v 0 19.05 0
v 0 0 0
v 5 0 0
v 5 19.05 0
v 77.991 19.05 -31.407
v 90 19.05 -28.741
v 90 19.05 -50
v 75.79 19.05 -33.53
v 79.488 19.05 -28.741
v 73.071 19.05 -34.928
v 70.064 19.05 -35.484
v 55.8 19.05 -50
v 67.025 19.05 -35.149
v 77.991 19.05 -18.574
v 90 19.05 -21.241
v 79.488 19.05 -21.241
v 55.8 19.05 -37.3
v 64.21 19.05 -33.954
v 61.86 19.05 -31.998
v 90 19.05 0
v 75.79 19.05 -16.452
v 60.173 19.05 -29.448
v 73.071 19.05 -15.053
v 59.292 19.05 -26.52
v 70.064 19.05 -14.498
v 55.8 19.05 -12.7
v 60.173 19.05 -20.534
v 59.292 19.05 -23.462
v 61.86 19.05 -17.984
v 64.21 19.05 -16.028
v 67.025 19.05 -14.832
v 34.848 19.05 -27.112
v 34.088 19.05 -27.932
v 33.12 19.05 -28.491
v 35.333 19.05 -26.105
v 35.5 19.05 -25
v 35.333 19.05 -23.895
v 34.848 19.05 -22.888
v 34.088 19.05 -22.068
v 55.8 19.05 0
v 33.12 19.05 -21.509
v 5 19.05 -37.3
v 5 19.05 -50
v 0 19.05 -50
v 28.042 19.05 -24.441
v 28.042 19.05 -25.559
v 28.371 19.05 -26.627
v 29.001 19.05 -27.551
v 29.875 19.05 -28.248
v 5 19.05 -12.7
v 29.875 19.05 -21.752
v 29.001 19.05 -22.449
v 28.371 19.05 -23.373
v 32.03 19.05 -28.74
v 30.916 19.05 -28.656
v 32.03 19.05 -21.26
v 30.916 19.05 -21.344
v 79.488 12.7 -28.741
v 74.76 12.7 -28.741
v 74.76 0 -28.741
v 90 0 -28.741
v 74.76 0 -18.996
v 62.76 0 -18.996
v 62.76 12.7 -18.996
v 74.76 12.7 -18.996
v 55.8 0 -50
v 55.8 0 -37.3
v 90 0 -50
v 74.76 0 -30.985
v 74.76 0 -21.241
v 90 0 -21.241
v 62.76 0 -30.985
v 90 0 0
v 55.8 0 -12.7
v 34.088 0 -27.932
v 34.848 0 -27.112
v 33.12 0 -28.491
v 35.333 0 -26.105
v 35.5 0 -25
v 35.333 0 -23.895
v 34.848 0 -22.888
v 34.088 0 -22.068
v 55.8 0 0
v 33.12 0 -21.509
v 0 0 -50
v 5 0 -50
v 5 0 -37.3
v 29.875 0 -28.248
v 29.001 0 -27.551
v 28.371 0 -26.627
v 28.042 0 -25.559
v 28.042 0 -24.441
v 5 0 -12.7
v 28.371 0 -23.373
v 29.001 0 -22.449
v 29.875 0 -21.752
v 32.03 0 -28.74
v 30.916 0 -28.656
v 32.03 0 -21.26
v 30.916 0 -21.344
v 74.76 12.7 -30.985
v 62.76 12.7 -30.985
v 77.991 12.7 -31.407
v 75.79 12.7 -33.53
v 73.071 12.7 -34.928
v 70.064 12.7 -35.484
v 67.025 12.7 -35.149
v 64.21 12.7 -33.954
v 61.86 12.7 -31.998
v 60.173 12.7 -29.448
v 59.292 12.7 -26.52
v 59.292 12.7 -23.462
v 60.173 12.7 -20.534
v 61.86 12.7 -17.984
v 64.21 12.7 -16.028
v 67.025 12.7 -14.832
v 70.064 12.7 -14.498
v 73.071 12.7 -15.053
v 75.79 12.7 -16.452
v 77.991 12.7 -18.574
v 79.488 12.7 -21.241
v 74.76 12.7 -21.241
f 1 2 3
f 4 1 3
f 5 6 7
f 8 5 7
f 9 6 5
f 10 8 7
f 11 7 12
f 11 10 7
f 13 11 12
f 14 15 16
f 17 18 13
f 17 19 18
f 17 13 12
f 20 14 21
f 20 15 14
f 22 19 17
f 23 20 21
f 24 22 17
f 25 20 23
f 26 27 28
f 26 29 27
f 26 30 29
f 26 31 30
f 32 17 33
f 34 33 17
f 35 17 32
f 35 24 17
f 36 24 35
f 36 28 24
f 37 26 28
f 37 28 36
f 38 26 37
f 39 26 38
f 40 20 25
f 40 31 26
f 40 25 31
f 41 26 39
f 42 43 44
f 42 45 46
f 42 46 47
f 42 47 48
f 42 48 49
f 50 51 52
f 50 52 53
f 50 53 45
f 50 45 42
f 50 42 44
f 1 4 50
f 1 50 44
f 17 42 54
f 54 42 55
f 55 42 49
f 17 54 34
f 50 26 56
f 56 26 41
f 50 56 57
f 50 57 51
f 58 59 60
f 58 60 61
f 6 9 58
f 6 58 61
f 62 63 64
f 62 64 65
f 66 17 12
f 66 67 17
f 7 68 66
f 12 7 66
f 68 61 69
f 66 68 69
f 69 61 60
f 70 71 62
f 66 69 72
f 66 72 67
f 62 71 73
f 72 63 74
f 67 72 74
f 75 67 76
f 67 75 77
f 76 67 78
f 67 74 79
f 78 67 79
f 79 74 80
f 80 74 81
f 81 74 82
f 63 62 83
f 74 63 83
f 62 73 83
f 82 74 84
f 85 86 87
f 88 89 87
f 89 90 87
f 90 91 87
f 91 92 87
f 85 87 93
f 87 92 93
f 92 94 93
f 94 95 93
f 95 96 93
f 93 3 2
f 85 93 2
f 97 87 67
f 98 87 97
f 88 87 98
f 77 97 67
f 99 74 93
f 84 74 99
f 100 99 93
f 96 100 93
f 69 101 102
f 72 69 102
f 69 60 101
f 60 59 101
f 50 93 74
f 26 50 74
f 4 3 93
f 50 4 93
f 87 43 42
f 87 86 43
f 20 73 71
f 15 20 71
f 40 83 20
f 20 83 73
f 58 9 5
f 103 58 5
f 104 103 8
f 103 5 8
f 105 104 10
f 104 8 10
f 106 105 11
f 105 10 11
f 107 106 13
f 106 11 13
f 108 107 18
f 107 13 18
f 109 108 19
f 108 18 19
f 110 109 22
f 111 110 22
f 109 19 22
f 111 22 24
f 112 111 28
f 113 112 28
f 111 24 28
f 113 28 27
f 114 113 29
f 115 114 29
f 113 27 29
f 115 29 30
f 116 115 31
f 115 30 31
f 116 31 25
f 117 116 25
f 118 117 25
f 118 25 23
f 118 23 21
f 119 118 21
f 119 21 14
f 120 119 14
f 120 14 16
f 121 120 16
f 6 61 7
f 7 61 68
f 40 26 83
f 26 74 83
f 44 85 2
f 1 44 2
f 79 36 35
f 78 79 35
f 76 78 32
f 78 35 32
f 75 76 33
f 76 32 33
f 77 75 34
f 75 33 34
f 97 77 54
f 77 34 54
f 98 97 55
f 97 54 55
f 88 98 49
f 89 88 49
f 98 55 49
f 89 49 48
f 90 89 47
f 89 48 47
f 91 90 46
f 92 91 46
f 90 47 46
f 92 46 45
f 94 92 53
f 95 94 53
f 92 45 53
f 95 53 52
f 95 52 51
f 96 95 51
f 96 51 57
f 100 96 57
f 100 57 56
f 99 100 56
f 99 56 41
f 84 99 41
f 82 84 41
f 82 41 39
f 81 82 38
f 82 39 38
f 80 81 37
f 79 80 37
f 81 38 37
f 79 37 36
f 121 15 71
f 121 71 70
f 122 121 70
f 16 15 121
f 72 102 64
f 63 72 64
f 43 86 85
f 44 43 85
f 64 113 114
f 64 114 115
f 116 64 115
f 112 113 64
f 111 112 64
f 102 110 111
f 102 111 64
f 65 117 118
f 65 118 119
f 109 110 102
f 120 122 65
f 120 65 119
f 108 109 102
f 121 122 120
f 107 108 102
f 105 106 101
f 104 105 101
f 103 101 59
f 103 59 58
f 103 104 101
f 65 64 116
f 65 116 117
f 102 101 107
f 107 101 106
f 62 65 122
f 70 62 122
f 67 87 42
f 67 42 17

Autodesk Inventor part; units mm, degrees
ref_plane "YZ Plane" through (0, 0, 0) normal (1, 0, 0) x (0, 1, 0)
ref_plane "XZ Plane" through (0, 0, 0) normal (0, 1, 0) x (-1, 0, 0)
ref_plane "XY Plane" through (0, 0, 0) normal (0, 0, 1) x (1, 0, 0)
sketch "Sketch1" plane through (0, 0, 0) normal (0, 1, 0) x (-1, 0, 0)
  line L0 (0, 0) -> (-90, 0)
  line L1 (-90, 0) -> (-90, -50)
  line L2 (-90, -50) -> (0, -50)
  line L3 (0, -50) -> (0, 0)
  line L4 (0, 0) -> (-5, 0)
  line L5 (0, -50) -> (-5, -50)
  line L6 (-5, -50) -> (-5, -37.3)
  line L7 (-5, 0) -> (-5, -12.7)
  line L8 (-5, -12.7) -> (-55.8, -12.7)
  line L9 (-55.8, -12.7) -> (-55.8, 0)
  line L10 (-55.8, 0) -> (-5, 0)
  line L11 (-5, 0) -> (-5, -12.7)
  line L12 (-5, -37.3) -> (-55.8, -37.3)
  line L13 (-55.8, -37.3) -> (-55.8, -50)
  line L14 (-55.8, -50) -> (-5, -50)
  line L15 (-5, -50) -> (-5, -37.3)
  dimension "d0" = 90
  dimension "d1" = 50
  dimension "d4" = 5
  dimension "d5" = 5
  dimension "d6" = 12.7
  dimension "d7" = 12.7
  dimension "d8" = 50.8
  dimension "d9" = 12.7
  dimension "d10" = 50.8
  dimension "d11" = 12.7
extrude "Extrusion2" add sketch "Sketch1" along normal blind 19.05 contours L3 L2 L6 L12 L13 L1 L0 L9 L8 L7
sketch "Sketch3" plane through (0, 19.05, 0) normal (0, 1, 0) x (1, 0, 0)
  line L0 (90, 0) -> (90, 50) projected
  line L1 (90, 25) -> (74.76, 25)
  line L2 (90, 25) -> (90, 28.75)
  line L3 (90, 25) -> (90, 21.2408)
  line L4 (90, 21.2408) -> (74.76, 21.2408)
  line L5 (74.76, 21.2408) -> (74.76, 28.7408)
  line L6 (74.76, 28.7408) -> (90, 28.7408)
  line L7 (90, 28.7408) -> (90, 21.2408)
  point P0 (0, 0)
  dimension "d18" = 15.24
  dimension "d19" = 3.75
  dimension "d20" = 3.7592
  dimension "d21" = 15.24
  dimension "d22" = 7.5
extrude "Extrusion4" cut sketch "Sketch3" against normal blind 19.05
sketch "Sketch4" plane through (0, 19.05, 0) normal (0, 1, 0) x (1, 0, 0)
  line L0 (74.76, 28.7408) -> (74.76, 21.2408) projected
  line L1 (74.76, 24.9908) -> (74.76, 30.9852)
  line L2 (74.76, 30.9852) -> (62.76, 30.9852)
  line L3 (62.76, 30.9852) -> (62.76, 18.9964)
  line L4 (62.76, 18.9964) -> (74.76, 18.9964)
  line L5 (74.76, 18.9964) -> (74.76, 30.9852)
  point P0 (0, 0)
  dimension "d25" = 5.9944
  dimension "d26" = 12
  dimension "d27" = 11.9888
extrude "Extrusion5" cut sketch "Sketch4" against normal blind 19.05
sketch "Sketch5" plane through (0, 19.05, 0) normal (0, 1, 0) x (1, 0, 0)
  circle A0 centre (69.68, 24.9908) radius 10.5
  point P0 (0, 0)
  dimension "d30" = 21
extrude "Extrusion6" cut sketch "Sketch5" against normal blind 6.35
sketch "Sketch6" plane through (0, 19.05, 0) normal (0, 1, 0) x (1, 0, 0)
  line L0 (0, 50) -> (0, 0) projected
  line L1 (0, 25) -> (31.75, 25)
  circle A0 centre (31.75, 25) radius 3.75
  dimension "d33" = 31.75
  dimension "d34" = 7.5
extrude "Extrusion7" cut sketch "Sketch6" against normal blind 19.05
properties part number "Maglev_holder"
